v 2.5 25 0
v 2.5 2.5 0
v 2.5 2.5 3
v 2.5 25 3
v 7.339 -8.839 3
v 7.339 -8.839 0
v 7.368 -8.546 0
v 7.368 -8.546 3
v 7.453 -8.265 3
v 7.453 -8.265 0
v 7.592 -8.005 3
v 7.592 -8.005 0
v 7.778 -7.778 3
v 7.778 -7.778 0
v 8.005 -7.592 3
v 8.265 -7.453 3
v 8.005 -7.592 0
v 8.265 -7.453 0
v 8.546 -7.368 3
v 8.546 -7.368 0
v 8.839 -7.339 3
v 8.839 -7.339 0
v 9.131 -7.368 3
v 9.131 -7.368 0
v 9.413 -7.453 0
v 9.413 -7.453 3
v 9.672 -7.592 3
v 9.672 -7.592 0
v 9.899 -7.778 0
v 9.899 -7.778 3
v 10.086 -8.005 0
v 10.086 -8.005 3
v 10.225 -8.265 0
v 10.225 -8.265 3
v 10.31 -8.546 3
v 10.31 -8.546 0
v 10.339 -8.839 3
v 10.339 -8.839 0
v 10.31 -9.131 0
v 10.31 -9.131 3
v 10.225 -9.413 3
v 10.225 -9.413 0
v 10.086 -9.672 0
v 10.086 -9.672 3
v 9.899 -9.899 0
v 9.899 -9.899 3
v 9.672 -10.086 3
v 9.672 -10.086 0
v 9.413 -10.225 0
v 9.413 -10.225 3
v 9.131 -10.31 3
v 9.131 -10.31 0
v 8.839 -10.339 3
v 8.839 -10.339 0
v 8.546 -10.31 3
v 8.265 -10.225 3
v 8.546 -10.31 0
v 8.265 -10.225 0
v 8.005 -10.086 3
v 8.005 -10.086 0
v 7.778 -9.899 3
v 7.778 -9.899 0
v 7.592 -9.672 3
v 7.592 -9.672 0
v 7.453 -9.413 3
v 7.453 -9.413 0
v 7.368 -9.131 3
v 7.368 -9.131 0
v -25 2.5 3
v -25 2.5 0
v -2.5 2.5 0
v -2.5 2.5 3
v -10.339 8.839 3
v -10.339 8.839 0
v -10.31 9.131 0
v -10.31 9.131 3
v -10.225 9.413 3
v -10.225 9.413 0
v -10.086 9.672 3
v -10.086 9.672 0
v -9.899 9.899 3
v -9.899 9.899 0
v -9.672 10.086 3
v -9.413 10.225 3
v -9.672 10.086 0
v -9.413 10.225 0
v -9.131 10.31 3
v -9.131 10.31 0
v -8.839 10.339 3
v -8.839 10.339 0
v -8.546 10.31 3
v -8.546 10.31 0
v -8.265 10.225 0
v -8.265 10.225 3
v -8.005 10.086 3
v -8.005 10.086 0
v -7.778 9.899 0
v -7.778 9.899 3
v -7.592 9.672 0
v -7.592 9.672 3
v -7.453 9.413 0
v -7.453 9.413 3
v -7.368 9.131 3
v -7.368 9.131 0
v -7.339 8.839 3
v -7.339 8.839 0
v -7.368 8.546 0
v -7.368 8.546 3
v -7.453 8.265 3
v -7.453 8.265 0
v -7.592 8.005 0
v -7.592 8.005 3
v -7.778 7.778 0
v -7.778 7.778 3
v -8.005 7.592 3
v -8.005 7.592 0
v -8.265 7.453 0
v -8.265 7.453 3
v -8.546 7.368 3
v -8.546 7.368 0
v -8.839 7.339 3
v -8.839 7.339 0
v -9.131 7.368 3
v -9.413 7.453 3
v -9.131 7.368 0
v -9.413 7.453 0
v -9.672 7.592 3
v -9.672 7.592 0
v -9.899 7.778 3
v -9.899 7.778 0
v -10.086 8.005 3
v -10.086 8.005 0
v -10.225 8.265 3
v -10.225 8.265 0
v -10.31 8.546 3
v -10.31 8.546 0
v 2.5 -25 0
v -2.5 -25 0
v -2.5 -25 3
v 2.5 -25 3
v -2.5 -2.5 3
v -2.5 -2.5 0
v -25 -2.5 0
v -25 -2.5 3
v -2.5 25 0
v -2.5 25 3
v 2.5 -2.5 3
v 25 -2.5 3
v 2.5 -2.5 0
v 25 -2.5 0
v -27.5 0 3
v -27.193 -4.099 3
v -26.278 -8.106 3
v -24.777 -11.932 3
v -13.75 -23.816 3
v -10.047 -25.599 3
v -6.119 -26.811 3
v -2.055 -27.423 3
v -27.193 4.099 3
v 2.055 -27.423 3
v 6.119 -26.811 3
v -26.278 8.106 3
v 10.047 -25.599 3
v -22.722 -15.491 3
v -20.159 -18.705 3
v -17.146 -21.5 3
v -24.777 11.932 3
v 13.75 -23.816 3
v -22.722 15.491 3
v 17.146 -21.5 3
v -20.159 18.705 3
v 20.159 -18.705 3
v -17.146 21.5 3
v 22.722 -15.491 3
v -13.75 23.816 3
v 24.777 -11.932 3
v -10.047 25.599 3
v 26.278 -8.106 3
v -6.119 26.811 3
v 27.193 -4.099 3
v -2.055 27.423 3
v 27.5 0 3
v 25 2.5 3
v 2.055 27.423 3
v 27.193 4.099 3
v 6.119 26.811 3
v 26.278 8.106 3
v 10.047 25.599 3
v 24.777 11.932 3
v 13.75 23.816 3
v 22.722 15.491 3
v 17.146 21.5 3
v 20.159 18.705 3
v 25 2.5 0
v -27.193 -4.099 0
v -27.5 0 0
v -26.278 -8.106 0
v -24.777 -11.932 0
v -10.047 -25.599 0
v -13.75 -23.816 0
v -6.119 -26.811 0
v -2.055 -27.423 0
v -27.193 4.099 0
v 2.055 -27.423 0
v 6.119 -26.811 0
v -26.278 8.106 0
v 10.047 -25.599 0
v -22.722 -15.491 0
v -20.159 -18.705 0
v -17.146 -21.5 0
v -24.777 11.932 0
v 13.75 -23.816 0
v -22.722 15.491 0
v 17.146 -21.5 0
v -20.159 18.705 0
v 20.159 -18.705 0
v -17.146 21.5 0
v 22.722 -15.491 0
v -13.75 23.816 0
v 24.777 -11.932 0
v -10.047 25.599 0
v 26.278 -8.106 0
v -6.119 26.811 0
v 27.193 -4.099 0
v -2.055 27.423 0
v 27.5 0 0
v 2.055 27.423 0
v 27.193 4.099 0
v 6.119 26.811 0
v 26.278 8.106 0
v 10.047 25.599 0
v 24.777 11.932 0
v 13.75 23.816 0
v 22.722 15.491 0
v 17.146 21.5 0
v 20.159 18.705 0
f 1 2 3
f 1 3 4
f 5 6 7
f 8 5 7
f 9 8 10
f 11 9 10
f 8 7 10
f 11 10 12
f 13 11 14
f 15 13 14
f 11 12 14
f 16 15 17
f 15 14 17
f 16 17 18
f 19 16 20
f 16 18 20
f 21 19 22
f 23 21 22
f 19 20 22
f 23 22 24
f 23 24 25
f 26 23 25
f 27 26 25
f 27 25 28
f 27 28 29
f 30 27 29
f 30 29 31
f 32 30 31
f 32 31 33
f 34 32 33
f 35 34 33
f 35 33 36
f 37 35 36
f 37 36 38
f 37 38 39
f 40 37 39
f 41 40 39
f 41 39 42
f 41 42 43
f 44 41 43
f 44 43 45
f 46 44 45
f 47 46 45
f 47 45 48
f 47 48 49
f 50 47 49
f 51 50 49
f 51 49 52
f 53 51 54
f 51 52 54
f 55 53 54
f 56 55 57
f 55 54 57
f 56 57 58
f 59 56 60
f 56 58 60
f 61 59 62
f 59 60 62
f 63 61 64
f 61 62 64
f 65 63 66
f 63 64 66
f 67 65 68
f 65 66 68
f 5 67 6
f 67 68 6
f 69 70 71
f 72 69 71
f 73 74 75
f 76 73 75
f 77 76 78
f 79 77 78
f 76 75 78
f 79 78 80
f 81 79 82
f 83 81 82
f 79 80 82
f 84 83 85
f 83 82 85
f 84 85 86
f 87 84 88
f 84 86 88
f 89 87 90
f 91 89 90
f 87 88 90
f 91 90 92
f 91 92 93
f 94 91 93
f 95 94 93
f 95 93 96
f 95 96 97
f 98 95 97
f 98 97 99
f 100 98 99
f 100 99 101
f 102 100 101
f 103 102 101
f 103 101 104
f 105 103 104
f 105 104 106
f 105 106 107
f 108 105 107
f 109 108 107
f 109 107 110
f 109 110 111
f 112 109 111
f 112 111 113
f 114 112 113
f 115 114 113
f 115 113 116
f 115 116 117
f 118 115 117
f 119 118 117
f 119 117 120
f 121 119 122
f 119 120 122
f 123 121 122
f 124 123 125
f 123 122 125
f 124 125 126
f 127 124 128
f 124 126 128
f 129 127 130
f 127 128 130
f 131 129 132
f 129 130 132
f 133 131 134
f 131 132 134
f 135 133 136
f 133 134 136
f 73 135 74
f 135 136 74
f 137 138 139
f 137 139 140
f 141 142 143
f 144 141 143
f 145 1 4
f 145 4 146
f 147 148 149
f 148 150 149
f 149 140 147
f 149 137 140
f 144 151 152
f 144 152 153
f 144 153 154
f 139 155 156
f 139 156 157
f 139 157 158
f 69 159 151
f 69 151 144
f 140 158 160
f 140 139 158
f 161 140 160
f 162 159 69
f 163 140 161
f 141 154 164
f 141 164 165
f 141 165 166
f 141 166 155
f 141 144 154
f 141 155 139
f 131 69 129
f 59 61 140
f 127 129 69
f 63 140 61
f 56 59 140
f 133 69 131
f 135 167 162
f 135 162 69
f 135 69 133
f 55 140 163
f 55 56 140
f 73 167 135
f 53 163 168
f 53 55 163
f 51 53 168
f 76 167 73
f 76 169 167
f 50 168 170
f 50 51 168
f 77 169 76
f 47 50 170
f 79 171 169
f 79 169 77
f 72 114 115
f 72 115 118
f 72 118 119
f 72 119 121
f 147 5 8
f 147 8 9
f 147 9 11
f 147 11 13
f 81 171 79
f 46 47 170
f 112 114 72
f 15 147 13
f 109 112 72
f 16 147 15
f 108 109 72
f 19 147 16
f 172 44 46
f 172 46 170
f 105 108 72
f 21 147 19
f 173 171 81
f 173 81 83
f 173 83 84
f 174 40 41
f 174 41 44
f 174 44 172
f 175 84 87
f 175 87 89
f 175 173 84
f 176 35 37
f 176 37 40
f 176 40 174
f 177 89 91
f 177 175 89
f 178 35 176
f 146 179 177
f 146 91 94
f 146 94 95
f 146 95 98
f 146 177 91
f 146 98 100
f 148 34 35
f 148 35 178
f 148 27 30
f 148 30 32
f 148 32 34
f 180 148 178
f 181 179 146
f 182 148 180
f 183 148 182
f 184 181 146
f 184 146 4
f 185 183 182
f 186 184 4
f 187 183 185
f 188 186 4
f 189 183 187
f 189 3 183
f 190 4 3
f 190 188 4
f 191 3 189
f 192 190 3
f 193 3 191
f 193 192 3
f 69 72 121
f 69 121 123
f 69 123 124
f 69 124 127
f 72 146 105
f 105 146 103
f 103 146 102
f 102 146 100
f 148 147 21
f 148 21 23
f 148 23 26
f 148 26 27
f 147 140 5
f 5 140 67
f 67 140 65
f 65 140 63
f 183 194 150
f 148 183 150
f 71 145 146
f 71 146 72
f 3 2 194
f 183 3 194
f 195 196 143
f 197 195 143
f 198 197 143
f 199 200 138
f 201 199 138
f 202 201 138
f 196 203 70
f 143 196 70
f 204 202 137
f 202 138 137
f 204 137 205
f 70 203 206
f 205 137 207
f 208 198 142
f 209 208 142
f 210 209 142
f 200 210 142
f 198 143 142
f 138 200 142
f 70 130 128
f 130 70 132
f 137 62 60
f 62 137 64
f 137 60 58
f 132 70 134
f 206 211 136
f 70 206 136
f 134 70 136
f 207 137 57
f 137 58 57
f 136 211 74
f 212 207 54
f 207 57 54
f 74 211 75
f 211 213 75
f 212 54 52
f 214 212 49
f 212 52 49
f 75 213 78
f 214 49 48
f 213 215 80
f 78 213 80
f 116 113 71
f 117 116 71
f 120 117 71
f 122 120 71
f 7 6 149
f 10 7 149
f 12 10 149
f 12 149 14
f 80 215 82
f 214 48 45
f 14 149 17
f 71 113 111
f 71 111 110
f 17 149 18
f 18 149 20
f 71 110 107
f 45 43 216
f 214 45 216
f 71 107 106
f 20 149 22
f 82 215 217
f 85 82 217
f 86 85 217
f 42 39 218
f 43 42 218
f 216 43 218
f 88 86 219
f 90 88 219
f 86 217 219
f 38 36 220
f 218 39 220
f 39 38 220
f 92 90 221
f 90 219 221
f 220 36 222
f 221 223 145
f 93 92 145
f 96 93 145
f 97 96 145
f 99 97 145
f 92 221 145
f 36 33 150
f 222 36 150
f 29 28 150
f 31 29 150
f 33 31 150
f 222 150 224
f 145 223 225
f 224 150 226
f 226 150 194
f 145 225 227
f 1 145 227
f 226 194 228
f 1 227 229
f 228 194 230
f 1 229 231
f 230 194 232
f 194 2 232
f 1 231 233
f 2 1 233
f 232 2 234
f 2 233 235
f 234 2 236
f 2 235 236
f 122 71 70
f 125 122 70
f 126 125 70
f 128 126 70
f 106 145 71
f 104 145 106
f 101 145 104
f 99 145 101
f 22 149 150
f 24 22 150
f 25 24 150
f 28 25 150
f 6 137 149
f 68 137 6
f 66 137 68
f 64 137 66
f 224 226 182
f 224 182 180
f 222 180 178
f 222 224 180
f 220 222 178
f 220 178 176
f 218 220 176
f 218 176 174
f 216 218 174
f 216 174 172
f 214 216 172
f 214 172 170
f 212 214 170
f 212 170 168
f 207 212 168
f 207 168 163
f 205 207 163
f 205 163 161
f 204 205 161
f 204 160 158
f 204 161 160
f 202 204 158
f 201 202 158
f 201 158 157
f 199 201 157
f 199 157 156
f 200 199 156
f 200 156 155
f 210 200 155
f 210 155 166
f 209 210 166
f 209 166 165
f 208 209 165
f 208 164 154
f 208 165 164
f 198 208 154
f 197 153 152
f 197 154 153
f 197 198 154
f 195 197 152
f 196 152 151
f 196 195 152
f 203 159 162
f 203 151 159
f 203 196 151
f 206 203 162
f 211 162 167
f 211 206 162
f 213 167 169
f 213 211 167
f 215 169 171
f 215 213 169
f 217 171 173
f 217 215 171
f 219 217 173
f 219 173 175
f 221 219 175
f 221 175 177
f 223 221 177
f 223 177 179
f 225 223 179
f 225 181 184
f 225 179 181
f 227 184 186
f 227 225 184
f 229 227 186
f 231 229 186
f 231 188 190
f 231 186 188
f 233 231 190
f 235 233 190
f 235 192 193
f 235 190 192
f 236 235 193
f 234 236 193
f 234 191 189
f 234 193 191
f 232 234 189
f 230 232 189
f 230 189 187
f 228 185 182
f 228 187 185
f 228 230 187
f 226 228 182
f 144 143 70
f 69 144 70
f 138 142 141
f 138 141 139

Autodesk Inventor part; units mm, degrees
ref_plane "YZ Plane" through (0, 0, 0) normal (1, 0, 0) x (0, 1, 0)
ref_plane "XZ Plane" through (0, 0, 0) normal (0, 1, 0) x (-1, 0, 0)
ref_plane "XY Plane" through (0, 0, 0) normal (0, 0, 1) x (1, 0, 0)
sketch "Sketch1" plane through (0, 0, 0) normal (0, 0, 1) x (1, 0, 0)
  circle A0 centre (0, 0) radius 27.5
  dimension "d0" = 55
extrude "Extrusion1" add sketch "Sketch1" along normal blind 3
sketch "Sketch2" plane through (0, 0, 0) normal (0, 0, -1) x (-1, 0, 0)
  circle A0 centre (0, 0) radius 27.5 projected
  line L0 (-2.5, -25) -> (-2.5, 25)
  line L1 (-2.5, 25) -> (2.5, 25)
  line L2 (2.5, 25) -> (2.5, -25)
  line L3 (2.5, -25) -> (-2.5, -25)
  line L4 (-2.5, -25) -> (2.5, 25) construction
  line L5 (-2.5, 25) -> (2.5, -25) construction
  line L6 (-25, -2.5) -> (25, -2.5)
  line L7 (25, -2.5) -> (25, 2.5)
  line L8 (25, 2.5) -> (-25, 2.5)
  line L9 (-25, 2.5) -> (-25, -2.5)
  line L10 (-25, -2.5) -> (25, 2.5) construction
  line L11 (25, -2.5) -> (-25, 2.5) construction
  dimension "d3" = 50
  dimension "d4" = 5
  dimension "d5" = 50
  dimension "d6" = 5
extrude "Extrusion2" cut sketch "Sketch2" against normal up to next contours L0 L6 L2 L3 | L6 L9 L8 L0 | L0 L8 L2 L6 | L0 L1 L2 L8 | L2 L8 L7 L6
sketch "Sketch3" plane through (0, 0, 0) normal (0, 0, -1) x (-1, 0, 0)
  circle A0 centre (8.8388, 8.8388) radius 1.5 projected
  circle A1 centre (-8.8388, -8.8388) radius 1.5 projected
extrude "Extrusion3" cut sketch "Sketch3" against normal up to next
properties part number "TransparentTop"
